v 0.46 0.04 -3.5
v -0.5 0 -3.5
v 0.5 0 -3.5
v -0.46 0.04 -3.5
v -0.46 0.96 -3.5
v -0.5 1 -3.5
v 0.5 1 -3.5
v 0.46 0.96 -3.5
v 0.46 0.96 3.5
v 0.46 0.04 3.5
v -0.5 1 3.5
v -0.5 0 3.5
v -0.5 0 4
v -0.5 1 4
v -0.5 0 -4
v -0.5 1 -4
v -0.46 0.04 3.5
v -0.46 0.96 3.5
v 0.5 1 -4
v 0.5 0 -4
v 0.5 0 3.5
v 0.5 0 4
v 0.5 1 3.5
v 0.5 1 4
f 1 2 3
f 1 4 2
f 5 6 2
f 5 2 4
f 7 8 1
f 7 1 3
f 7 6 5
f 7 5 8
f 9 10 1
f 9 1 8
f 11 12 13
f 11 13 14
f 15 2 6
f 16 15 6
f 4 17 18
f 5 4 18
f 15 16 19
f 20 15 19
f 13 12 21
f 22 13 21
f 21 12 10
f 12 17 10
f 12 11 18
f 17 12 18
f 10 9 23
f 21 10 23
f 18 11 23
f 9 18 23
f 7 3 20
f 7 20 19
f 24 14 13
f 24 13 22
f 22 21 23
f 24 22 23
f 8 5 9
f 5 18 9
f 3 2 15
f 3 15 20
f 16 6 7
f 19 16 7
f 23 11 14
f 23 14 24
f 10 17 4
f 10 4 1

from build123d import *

# Parameters (mm, degrees)
SKETCH1_W           = 0.92
SKETCH1_H           = 0.92
BOSS_EXTRUDE1_DEPTH = 3.5
SKETCH2_W           = 1
SKETCH2_H           = 1
BOSS_EXTRUDE2_DEPTH = 0.5


with BuildPart() as part:
    # Sketch1 → Boss-Extrude1 (new body, symmetric)
    with BuildSketch(Plane.XY):
        with Locations((0, 0.5)):
            Rectangle(SKETCH1_W, SKETCH1_H)
    extrude(amount=BOSS_EXTRUDE1_DEPTH, both=True)

    # Sketch2 → Boss-Extrude2 (add)
    with BuildSketch(Plane.XY.offset(3.5)):
        with Locations((0, 0.5)):
            Rectangle(SKETCH2_W, SKETCH2_H)
    boss_extrude2 = extrude(amount=BOSS_EXTRUDE2_DEPTH)

    # Mirror1: Boss-Extrude2 across plane
    add(boss_extrude2.mirror(Plane.XY))


solid = part.part
